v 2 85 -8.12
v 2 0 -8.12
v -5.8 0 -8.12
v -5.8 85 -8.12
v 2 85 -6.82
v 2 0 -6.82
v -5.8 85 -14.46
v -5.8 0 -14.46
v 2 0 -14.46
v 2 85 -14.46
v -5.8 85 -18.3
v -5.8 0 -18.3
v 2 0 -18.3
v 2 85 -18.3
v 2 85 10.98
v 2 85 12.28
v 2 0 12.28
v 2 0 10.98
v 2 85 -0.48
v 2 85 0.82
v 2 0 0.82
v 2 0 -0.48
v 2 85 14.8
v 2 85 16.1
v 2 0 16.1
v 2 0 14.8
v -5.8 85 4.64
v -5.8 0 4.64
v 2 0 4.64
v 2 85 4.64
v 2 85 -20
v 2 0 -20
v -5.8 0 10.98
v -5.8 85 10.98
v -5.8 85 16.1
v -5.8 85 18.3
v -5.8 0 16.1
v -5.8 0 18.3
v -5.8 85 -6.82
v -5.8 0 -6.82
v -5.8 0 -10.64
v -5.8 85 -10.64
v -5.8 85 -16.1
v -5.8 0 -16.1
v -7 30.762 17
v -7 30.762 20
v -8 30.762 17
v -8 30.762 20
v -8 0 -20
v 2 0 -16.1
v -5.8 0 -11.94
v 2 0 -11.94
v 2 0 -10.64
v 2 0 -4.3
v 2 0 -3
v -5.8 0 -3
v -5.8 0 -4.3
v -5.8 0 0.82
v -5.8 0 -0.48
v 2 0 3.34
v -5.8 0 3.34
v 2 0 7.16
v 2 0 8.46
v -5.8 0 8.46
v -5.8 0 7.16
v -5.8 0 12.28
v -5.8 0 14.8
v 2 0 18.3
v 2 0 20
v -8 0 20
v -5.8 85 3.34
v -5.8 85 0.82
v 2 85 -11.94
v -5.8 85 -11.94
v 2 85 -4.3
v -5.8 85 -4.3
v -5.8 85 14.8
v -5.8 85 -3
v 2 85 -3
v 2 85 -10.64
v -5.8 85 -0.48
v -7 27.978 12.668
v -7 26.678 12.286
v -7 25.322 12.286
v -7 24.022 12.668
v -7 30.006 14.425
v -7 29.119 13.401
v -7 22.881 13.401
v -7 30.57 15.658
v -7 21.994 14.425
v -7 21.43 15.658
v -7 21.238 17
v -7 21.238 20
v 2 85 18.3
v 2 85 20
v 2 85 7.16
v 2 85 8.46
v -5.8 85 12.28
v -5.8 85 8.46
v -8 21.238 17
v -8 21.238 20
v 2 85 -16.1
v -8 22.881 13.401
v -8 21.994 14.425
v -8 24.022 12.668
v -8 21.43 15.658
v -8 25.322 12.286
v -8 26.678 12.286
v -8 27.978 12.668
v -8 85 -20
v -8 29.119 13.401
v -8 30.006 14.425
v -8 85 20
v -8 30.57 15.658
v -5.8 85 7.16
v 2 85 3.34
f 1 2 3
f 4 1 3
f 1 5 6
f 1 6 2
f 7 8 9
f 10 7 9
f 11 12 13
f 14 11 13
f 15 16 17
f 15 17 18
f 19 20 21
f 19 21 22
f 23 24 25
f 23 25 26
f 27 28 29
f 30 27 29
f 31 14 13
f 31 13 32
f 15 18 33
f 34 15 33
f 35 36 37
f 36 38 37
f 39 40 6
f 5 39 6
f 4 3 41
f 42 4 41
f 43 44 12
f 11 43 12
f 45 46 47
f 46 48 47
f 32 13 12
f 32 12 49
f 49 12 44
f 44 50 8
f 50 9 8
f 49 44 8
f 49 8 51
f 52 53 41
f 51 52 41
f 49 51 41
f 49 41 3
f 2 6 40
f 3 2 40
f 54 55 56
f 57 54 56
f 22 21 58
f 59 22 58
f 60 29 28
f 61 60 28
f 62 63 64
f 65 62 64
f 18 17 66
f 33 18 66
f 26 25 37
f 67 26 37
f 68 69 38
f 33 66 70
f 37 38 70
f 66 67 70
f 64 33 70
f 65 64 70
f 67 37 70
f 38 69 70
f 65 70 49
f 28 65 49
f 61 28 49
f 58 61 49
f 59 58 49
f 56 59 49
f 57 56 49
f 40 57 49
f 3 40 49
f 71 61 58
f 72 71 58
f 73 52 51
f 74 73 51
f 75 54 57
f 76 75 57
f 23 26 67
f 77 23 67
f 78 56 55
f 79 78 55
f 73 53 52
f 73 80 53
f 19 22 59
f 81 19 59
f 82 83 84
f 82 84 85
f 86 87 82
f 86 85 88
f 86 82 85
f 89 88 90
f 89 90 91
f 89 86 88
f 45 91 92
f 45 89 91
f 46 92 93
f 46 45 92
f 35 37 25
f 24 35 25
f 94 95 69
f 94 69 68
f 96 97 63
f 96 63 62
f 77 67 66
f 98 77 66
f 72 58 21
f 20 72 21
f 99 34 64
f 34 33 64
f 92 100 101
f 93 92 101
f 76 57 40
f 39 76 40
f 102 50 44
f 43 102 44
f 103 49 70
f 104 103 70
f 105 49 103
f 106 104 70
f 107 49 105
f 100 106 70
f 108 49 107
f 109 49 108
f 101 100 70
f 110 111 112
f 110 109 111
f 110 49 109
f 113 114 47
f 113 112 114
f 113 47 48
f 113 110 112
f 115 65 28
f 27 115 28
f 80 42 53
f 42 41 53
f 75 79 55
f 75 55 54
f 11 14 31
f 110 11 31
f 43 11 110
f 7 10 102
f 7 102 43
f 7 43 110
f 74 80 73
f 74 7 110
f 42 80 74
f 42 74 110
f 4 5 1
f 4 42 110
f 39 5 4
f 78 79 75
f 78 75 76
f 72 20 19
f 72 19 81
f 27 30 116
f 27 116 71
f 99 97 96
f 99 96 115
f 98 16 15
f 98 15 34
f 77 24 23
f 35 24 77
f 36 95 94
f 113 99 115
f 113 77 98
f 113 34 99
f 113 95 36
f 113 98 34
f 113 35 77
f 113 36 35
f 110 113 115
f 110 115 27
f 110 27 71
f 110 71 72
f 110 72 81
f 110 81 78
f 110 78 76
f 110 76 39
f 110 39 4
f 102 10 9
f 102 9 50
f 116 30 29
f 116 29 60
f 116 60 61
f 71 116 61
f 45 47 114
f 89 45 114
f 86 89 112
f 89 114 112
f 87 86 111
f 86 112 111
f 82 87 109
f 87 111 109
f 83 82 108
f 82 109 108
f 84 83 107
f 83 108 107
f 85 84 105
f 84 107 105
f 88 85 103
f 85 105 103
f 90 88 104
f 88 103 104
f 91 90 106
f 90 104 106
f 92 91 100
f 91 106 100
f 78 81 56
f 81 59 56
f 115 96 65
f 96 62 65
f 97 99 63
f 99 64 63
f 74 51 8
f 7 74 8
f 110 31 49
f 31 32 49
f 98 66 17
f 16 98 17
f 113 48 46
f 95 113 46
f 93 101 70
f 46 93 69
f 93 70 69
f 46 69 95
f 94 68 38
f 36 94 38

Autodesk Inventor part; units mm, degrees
ref_plane "YZ Plane" through (0, 0, 0) normal (1, 0, 0) x (0, 1, 0)
ref_plane "XZ Plane" through (0, 0, 0) normal (0, 1, 0) x (-1, 0, 0)
ref_plane "XY Plane" through (0, 0, 0) normal (0, 0, 1) x (1, 0, 0)
sketch "Sketch1" plane through (0, 0, 0) normal (0, 1, 0) x (-1, 0, 0)
  line L0 (-10, -20) -> (10, -20)
  line L1 (10, -20) -> (10, 20)
  line L2 (10, 20) -> (-10, 20)
  line L3 (-10, 20) -> (-10, -20)
  line L4 (-10, -20) -> (10, 20) construction
  line L5 (10, -20) -> (-10, 20) construction
  point P0 (0, 0)
  dimension "d0" = 20
  dimension "d1" = 40
extrude "Extrusion1" add sketch "Sketch1" along normal blind 85
sketch "Sketch2" plane through (0, 0, 0) normal (0, -1, 0) x (1, 0, 0)
  line L0 (10, -20) -> (-10, -20) projected
  line L1 (10, 20) -> (10, -20) projected
  line L2 (-10, 20) -> (10, 20) projected
  line L3 (-10, -20) -> (-10, 20) projected
  line L4 (10, 20) -> (10, -20) projected
  line L5 (10, 18.3) -> (-5.8, 18.3)
  line L6 (-5.8, 18.3) -> (-5.8, 16.1)
  line L7 (-5.8, 16.1) -> (10, 16.1)
  line L8 (10, 16.1) -> (10, 18.3)
  point P0 (0, 0)
  dimension "d4" = 1.7
  dimension "d5" = 4.2
  dimension "d6" = 2.2
extrude "Extrusion2" cut sketch "Sketch2" against normal through all contours L7 L6 L5 L1
mirror "Mirror1" about plane through (0, 0, 0) normal (0, 0, 1) of "Extrusion2"
sketch "Sketch3" plane through (0, 0, 0) normal (0, -1, 0) x (1, 0, 0)
  line L0 (-5.8, -16.1) -> (10, -16.1) projected
  line L1 (10, 16.1) -> (10, -16.1) projected
  line L2 (10, 16.1) -> (-5.8, 16.1) projected
  line L3 (-5.8, 16.1) -> (-5.8, 18.3) projected
  line L4 (-5.8, 18.3) -> (10, 18.3) projected
  line L5 (10, 20) -> (10, 18.3) projected
  line L6 (-10, 20) -> (10, 20) projected
  line L7 (-10, -20) -> (-10, 20) projected
  line L8 (10, -20) -> (-10, -20) projected
  line L9 (10, -18.3) -> (10, -20) projected
  line L10 (10, -18.3) -> (-5.8, -18.3) projected
  line L11 (-5.8, -18.3) -> (-5.8, -16.1) projected
  line L12 (10, 14.8) -> (-5.8, 14.8)
  line L13 (-5.8, 14.8) -> (-5.8, 12.28)
  line L14 (-5.8, 12.28) -> (10, 12.28)
  line L15 (10, 12.28) -> (10, 14.8)
  point P0 (0, 0)
  dimension "d9" = 1.3
  dimension "d10" = 2.52
extrude "Extrusion3" cut sketch "Sketch3" against normal through all contours L14 L13 L12 L1
pattern_linear "Rectangular Pattern1" count 8 spacing 3.82 along (0, 0, -1) of "Extrusion3"
sketch "Sketch4" plane through (-10, 0, -20) normal (-1, 0, 0) x (0, 0, 1)
  line L0 (0, 0) -> (40, 0) projected
  line L1 (40, 0) -> (40, 85) projected
  line L2 (0, 85) -> (40, 85) projected
  line L3 (0, 0) -> (0, 85) projected
  point P0 (20, 0)
extrude "Extrusion4" cut sketch "Sketch4" against normal blind 2
sketch "Sketch5" plane through (10, 0, 20) normal (1, 0, 0) x (0, 0, -1)
  line L0 (-7.9901, -7.3422) -> (53.3048, -7.3422)
  line L1 (53.3048, -7.3422) -> (53.3048, 101.8937)
  line L2 (53.3048, 101.8937) -> (-7.9901, 101.8937)
  line L3 (-7.9901, 101.8937) -> (-7.9901, -7.3422)
  point P0 (20, 0)
extrude "Extrusion5" cut sketch "Sketch5" against normal blind 8
sketch "Sketch7" plane through (-8, 0, -20) normal (-1, 0, 0) x (0, 0, 1)
  circle A0 centre (37, 26) radius 4.7625
  line L0 (40, 85) -> (40, 0) projected
  line L1 (40, 0) -> (0, 0) projected
  line L2 (37, 21.2375) -> (47, 21.2375)
  line L3 (47, 21.2375) -> (47, 30.7625)
  line L4 (47, 30.7625) -> (37, 30.7625)
  line L5 (37, 30.7625) -> (37, 21.2375)
  point P0 (20, 0)
  dimension "d24" = 9.525
  dimension "d25" = 3
  dimension "d26" = 26
  dimension "d29" = 10
extrude "Extrusion7" cut sketch "Sketch7" against normal blind 1
properties part number "Ultra96_Heatsink"
